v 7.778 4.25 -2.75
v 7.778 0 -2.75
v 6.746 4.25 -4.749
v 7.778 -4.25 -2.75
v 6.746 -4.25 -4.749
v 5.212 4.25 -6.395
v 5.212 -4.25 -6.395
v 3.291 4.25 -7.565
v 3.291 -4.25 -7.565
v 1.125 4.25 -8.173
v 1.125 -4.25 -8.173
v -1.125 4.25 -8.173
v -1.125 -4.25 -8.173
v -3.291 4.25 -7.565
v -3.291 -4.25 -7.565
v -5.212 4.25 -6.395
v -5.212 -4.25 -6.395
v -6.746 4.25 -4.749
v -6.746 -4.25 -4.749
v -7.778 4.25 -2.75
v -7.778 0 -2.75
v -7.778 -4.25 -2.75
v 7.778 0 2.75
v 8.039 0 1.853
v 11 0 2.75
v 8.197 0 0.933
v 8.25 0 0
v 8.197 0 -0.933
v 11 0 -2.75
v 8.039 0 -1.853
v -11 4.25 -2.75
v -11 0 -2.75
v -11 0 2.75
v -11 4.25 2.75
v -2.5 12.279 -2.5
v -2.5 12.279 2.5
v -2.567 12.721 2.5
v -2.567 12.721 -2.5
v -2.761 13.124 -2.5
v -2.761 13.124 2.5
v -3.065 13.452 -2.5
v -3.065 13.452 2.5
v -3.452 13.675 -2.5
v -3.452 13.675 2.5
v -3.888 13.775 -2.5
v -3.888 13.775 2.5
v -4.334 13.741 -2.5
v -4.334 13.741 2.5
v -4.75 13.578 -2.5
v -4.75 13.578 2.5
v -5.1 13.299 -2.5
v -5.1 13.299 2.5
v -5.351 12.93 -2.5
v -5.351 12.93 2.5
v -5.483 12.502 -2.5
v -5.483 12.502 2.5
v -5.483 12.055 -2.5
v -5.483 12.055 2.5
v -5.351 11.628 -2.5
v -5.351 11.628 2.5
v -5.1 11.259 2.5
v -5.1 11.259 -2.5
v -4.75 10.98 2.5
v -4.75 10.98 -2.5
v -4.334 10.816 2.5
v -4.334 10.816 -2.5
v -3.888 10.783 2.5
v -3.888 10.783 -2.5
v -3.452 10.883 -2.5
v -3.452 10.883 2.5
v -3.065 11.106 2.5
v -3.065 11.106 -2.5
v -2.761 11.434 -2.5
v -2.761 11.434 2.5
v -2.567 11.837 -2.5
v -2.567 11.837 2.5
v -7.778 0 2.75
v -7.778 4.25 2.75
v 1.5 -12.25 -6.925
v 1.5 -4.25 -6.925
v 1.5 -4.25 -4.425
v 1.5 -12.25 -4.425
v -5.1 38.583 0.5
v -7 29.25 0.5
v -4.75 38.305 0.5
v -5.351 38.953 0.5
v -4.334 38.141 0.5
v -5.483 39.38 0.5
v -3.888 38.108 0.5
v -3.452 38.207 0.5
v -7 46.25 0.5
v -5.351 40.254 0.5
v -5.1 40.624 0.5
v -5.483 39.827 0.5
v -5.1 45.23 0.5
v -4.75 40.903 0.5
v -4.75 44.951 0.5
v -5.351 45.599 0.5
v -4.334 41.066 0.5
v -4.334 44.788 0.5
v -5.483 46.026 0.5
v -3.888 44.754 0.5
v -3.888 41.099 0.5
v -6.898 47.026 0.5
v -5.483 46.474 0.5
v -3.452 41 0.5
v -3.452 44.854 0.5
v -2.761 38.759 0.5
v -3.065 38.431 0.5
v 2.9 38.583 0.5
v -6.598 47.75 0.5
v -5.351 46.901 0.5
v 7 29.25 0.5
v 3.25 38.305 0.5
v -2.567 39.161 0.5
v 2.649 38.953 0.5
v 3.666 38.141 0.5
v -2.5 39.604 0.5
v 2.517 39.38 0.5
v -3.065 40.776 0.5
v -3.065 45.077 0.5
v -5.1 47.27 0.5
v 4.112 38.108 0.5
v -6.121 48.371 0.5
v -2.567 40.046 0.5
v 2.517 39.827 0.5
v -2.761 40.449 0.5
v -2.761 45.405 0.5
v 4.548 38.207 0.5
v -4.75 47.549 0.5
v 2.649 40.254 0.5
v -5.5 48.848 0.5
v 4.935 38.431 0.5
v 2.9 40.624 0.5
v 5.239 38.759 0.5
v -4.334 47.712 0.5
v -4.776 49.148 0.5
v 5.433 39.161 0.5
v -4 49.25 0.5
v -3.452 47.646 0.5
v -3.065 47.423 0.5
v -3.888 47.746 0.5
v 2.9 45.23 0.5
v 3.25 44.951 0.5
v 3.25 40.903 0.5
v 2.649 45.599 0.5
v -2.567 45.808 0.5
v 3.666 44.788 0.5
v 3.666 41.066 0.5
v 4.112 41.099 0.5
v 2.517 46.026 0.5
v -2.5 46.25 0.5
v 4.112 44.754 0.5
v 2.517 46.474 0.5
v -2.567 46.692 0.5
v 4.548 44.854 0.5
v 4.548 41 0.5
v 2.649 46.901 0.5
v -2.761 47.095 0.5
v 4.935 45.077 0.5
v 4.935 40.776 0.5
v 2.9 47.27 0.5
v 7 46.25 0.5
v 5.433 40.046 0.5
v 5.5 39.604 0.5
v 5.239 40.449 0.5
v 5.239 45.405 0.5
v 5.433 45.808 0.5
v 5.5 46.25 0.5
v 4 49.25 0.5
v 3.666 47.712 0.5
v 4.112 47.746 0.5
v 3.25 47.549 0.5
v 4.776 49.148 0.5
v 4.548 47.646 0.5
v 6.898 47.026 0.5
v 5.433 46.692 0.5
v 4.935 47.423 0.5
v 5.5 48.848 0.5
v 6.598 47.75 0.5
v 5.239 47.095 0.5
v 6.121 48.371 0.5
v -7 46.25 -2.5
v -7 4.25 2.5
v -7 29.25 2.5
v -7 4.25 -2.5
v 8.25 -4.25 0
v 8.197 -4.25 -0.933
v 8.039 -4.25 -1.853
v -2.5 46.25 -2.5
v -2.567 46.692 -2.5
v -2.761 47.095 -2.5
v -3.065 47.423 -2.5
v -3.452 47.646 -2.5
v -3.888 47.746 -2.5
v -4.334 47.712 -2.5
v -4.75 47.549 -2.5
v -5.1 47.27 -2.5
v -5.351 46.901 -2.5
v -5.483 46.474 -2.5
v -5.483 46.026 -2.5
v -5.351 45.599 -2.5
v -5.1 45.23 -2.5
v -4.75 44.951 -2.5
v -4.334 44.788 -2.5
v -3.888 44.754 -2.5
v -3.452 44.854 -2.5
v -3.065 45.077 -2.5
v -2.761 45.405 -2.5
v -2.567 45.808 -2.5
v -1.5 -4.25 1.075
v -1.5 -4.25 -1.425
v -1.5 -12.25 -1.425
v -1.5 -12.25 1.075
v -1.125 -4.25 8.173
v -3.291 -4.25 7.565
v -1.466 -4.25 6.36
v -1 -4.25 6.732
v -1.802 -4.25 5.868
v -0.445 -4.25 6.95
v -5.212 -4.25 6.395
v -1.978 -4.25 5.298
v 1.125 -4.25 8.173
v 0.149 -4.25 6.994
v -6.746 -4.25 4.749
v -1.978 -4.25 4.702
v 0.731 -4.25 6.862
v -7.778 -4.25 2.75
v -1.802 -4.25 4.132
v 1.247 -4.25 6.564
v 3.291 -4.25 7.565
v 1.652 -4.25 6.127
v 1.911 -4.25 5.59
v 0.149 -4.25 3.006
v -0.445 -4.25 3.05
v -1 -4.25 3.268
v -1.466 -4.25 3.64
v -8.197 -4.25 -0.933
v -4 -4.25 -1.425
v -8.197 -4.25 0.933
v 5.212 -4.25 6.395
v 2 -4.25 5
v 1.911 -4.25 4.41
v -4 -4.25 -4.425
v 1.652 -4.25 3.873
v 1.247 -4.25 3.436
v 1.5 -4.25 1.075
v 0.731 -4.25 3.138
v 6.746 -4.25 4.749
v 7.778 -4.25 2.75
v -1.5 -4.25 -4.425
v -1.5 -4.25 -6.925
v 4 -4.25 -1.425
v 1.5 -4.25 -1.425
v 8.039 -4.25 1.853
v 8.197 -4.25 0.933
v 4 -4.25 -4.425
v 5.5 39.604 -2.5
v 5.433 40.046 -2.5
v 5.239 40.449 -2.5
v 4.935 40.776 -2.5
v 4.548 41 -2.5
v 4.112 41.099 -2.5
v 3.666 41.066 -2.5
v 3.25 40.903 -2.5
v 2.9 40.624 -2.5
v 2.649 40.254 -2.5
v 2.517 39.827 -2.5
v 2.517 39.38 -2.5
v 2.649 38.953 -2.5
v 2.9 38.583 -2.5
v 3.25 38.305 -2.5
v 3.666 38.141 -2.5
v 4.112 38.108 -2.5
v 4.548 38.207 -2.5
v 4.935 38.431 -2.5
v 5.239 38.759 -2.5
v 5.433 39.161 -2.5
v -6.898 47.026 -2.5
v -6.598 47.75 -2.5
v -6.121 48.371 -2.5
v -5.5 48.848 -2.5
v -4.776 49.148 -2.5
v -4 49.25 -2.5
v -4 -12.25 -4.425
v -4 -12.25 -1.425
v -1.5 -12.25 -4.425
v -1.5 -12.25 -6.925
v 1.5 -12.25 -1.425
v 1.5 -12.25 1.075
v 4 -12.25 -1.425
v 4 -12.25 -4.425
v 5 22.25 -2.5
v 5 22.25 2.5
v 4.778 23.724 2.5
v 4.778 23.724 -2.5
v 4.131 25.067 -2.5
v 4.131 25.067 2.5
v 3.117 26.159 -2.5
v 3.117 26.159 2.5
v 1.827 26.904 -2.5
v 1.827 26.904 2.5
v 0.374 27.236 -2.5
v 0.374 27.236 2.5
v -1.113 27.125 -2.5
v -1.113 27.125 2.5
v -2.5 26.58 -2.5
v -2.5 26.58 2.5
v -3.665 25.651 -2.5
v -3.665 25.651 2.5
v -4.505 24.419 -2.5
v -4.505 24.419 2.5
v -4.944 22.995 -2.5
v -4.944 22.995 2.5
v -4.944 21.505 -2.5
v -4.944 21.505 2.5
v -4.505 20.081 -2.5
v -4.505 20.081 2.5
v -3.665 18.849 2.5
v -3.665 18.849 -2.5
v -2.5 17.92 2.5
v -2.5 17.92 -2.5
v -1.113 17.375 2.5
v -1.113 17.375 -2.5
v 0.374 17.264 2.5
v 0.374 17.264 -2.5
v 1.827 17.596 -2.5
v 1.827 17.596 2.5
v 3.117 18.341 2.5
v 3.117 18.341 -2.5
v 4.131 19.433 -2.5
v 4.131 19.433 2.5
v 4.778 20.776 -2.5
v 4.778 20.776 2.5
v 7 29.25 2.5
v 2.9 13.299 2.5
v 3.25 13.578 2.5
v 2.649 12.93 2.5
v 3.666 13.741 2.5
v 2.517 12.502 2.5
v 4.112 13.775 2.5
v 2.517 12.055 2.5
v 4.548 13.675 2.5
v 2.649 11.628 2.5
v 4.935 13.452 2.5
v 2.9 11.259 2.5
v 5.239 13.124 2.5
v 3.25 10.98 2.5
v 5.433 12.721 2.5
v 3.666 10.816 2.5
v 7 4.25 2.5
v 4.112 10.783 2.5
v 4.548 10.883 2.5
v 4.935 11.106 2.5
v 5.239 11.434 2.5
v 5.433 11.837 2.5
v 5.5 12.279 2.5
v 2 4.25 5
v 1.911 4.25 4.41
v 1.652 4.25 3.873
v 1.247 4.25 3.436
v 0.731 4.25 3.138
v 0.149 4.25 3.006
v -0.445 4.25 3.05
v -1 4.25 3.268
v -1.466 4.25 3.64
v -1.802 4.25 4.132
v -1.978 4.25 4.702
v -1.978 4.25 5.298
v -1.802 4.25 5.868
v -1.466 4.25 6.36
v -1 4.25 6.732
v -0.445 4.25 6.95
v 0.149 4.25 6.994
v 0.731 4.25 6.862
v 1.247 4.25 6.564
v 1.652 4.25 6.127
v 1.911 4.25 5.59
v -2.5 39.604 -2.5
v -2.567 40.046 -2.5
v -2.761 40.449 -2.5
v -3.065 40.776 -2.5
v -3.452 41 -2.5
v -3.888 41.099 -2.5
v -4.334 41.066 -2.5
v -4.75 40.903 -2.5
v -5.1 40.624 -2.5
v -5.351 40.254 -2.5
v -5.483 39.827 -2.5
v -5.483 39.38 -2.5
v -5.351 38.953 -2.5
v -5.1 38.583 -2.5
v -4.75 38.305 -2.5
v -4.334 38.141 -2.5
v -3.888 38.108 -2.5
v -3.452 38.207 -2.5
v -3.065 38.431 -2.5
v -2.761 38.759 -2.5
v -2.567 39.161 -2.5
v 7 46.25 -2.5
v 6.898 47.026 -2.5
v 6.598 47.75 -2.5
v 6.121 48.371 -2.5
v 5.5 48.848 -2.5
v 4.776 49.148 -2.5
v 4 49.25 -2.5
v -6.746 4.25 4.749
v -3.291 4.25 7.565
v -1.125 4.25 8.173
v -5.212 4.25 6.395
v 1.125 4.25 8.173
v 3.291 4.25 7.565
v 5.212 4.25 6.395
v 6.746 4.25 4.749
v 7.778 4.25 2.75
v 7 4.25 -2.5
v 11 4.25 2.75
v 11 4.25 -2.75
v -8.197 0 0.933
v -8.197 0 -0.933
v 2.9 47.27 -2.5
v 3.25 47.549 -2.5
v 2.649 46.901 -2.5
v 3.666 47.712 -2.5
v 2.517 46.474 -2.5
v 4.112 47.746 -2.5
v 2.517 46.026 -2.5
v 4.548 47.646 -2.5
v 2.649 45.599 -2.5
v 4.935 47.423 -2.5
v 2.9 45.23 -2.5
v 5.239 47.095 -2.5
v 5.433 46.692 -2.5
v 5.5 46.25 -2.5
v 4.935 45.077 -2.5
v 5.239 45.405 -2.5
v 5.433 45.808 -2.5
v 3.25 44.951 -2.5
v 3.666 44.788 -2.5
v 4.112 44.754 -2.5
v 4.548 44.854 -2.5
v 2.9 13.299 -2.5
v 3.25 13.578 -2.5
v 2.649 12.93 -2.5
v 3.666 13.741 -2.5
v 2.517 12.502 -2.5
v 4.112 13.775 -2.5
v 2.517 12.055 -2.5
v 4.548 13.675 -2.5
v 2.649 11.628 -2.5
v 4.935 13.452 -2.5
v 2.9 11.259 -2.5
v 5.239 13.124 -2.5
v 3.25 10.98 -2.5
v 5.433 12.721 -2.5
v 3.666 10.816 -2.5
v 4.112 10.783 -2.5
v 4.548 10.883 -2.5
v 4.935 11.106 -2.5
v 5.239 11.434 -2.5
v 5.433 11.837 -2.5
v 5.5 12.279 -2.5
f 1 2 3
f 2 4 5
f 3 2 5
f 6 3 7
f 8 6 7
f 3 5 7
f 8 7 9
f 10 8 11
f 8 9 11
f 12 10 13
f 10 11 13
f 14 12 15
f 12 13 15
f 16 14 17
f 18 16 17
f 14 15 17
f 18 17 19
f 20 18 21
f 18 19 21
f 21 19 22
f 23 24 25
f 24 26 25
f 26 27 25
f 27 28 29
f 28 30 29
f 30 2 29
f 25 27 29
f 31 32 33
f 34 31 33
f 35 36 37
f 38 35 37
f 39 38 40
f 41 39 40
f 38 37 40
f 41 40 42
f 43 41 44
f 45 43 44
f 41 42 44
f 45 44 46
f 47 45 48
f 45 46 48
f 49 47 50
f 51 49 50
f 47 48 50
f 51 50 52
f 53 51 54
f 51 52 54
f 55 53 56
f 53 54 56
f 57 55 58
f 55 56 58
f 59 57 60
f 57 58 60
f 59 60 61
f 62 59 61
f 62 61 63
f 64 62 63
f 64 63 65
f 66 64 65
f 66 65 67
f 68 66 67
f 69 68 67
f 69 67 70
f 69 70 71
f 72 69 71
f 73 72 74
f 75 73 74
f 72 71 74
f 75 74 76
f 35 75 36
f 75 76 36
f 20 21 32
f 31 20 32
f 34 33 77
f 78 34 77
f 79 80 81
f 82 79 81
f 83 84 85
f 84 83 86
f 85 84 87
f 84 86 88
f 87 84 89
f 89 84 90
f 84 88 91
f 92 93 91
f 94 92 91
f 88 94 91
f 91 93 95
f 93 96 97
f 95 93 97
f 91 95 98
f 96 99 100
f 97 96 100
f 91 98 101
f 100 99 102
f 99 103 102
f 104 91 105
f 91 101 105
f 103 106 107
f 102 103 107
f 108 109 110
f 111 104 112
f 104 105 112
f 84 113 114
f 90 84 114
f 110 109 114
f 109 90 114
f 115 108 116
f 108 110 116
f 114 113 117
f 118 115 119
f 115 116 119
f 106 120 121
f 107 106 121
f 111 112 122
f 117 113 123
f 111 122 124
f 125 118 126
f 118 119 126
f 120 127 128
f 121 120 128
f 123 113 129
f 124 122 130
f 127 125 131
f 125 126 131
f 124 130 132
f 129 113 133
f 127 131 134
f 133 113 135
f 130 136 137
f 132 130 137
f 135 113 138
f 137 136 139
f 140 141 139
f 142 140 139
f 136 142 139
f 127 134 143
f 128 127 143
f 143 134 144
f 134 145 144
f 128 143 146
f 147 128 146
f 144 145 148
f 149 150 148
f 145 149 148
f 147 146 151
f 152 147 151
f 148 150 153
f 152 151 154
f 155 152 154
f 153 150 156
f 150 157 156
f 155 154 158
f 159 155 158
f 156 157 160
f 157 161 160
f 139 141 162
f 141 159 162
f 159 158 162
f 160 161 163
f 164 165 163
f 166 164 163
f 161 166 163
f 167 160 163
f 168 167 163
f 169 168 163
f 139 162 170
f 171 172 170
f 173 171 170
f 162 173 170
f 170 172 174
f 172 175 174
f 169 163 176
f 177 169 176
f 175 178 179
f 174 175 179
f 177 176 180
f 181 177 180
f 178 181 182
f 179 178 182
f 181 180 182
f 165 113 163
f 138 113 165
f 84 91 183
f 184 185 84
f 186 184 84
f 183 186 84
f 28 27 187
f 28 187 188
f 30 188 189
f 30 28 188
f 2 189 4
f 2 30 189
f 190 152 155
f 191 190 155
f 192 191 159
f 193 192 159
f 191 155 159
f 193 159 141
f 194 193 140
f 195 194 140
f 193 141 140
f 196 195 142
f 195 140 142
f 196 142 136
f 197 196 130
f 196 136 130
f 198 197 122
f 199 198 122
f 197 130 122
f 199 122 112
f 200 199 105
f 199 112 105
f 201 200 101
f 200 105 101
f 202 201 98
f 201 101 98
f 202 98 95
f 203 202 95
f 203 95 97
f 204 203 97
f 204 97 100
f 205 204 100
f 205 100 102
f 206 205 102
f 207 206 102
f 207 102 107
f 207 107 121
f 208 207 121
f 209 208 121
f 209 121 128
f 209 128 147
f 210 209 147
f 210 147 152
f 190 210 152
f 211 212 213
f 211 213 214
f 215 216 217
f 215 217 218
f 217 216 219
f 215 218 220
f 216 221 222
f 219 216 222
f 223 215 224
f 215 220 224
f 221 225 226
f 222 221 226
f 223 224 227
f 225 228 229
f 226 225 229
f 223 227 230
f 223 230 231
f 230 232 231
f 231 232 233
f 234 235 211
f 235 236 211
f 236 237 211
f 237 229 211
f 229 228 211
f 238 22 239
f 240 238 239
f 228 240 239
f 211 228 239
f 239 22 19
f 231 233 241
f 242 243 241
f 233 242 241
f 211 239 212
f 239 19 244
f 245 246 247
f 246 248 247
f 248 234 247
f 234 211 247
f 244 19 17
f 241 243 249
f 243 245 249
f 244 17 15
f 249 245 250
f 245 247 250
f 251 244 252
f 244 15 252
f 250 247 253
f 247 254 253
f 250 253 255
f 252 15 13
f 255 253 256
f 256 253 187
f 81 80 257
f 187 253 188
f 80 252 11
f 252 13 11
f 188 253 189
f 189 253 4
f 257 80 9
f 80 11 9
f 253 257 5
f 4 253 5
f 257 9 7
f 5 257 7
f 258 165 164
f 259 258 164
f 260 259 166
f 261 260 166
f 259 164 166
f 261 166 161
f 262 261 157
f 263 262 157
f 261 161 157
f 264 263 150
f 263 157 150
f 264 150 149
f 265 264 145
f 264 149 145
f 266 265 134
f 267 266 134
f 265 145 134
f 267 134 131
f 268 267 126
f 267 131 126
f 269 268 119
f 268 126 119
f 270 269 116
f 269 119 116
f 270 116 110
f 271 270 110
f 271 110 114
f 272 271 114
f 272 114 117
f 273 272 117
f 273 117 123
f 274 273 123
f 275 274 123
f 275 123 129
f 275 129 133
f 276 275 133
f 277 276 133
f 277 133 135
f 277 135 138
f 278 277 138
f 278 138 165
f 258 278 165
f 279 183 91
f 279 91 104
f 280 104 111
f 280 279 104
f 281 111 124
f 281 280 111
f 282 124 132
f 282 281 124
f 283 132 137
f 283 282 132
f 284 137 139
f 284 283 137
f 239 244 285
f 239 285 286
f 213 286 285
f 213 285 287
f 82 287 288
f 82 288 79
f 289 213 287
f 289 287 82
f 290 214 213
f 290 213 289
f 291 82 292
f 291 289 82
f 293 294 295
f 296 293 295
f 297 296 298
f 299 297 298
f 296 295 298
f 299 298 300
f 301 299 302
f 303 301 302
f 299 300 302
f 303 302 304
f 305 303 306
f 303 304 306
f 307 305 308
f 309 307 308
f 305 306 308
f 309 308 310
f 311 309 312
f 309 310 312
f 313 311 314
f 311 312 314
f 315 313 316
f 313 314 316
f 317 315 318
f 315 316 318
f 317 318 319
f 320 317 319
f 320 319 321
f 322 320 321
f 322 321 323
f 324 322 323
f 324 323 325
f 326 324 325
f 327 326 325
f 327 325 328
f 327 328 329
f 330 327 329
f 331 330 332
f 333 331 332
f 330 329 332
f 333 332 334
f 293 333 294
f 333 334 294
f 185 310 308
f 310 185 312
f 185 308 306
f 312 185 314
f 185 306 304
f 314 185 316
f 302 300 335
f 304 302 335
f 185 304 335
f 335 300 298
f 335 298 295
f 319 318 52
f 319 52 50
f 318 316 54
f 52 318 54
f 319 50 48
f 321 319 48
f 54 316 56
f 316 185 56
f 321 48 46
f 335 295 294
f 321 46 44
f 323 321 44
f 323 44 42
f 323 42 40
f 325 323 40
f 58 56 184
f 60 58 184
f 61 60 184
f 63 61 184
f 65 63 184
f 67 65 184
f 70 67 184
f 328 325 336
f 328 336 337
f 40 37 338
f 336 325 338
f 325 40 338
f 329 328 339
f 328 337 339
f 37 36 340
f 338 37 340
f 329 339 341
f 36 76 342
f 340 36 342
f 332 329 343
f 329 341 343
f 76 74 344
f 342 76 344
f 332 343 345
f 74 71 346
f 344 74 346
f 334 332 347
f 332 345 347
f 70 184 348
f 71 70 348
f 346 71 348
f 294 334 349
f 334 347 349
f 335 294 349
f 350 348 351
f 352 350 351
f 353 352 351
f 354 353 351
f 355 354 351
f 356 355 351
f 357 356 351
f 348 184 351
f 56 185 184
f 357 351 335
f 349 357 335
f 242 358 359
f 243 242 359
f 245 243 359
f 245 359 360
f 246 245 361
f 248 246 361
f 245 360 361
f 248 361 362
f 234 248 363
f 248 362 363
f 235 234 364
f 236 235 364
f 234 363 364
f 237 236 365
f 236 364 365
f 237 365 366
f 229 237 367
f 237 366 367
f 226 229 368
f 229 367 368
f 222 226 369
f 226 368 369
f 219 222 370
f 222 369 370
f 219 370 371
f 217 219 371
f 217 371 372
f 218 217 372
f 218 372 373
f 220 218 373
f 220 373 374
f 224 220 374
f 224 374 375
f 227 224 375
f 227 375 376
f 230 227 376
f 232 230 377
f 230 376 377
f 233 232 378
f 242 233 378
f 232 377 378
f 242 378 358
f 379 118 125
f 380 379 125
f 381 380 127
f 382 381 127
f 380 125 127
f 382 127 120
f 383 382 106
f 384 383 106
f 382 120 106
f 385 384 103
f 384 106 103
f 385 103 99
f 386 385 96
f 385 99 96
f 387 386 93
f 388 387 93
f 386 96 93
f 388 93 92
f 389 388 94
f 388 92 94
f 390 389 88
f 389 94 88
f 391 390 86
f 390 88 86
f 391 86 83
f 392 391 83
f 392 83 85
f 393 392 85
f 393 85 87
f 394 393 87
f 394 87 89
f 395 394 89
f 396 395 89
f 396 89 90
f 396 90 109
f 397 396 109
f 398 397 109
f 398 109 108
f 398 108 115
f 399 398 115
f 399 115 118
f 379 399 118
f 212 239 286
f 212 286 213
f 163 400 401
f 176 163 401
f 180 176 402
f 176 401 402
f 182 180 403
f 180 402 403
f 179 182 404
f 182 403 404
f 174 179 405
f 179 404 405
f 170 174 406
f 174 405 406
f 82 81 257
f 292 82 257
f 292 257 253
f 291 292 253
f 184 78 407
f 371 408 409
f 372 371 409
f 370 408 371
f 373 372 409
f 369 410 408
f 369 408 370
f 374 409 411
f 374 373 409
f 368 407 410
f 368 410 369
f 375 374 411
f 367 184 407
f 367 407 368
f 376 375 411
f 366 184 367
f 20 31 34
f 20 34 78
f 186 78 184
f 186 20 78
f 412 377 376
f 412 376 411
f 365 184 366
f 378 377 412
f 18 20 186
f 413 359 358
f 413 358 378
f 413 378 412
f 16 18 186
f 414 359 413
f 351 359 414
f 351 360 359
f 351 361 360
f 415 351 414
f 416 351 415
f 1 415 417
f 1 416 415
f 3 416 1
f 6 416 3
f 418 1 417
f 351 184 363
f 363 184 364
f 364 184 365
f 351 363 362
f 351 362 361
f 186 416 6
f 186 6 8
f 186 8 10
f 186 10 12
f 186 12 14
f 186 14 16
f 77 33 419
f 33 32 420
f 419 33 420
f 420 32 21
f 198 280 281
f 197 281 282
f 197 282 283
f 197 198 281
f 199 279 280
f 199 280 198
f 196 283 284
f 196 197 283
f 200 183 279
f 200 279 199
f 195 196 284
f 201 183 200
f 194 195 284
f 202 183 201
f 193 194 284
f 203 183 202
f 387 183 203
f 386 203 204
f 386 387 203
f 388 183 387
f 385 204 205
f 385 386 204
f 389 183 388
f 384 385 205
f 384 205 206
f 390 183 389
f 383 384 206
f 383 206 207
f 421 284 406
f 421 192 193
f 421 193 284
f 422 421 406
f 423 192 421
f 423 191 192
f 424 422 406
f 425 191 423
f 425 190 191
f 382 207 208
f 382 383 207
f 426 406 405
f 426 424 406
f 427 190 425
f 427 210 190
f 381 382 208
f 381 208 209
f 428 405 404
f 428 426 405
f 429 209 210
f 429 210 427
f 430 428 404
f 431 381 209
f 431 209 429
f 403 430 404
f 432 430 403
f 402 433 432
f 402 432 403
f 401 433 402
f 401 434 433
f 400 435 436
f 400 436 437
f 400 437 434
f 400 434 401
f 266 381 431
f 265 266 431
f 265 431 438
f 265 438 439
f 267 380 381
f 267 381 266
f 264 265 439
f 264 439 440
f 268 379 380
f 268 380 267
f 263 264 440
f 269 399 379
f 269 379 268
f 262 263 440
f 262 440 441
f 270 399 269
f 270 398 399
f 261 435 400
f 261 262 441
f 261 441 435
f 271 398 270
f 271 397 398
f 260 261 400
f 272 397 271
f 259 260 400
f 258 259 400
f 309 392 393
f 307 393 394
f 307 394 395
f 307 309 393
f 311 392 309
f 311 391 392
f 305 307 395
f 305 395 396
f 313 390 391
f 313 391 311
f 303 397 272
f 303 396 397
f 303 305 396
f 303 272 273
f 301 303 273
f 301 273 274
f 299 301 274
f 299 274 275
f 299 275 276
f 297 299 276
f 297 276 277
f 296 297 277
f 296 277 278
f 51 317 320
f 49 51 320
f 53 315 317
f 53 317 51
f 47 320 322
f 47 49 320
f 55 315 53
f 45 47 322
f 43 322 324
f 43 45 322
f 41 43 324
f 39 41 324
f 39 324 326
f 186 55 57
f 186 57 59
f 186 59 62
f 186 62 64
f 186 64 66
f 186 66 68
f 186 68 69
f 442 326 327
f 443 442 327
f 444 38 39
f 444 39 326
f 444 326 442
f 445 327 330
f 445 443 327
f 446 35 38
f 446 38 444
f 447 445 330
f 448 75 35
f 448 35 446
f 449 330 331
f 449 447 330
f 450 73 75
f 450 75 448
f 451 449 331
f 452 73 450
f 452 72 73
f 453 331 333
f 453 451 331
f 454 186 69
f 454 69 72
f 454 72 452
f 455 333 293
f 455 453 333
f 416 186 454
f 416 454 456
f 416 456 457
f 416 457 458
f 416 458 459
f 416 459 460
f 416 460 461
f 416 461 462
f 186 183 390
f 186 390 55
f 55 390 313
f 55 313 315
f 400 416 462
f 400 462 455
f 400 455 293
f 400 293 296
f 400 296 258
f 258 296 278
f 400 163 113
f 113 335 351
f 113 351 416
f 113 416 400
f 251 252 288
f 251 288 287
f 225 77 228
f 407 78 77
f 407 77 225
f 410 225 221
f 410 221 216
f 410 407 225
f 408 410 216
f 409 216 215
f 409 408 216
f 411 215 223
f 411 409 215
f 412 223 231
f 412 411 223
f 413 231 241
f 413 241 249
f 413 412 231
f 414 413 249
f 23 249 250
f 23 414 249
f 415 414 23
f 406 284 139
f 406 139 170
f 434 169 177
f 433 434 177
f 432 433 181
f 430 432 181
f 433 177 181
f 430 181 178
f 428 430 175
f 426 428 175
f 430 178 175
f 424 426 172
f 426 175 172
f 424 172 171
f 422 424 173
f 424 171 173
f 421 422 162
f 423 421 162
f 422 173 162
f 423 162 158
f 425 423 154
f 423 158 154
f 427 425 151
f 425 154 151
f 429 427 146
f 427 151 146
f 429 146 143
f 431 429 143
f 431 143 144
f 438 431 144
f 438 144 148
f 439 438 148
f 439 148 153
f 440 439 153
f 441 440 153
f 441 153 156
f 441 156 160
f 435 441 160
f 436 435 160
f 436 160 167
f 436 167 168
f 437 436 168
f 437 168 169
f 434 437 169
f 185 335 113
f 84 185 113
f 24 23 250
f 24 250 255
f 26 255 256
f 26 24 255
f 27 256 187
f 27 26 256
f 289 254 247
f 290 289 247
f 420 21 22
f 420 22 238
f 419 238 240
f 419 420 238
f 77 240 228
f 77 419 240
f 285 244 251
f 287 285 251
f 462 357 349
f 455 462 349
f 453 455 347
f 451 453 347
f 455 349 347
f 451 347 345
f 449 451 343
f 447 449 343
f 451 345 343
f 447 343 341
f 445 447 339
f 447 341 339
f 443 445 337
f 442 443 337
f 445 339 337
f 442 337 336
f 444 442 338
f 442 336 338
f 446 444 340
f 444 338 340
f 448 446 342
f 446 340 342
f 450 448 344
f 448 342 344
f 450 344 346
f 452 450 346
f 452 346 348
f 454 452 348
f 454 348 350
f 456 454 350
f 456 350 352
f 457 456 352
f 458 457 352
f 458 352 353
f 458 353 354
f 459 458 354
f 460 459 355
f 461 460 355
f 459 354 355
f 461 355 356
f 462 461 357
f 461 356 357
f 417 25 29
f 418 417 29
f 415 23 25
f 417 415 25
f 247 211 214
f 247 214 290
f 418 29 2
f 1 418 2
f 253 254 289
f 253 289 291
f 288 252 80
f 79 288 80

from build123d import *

# Parameters (mm, degrees)
BOSS_EXTRU_1_DEPTH      = 4.25
BOSS_EXTRU_2_DEPTH      = 4.25
ESQUISSE2_R             = 2
ENL_V_MAT_EXTRU_1_DEPTH = 8.5
ESQUISSE3_W             = 2.5
ESQUISSE3_H             = 3
ESQUISSE3_W_2           = 3
ESQUISSE3_H_2           = 2.5
BOSS_EXTRU_3_DEPTH      = 8
ESQUISSE4_W             = 14
ESQUISSE4_H             = 5
BOSS_EXTRU_4_DEPTH      = 45
ESQUISSE5_R             = 1.5
ESQUISSE5_R_2           = 5
ENL_V_MAT_EXTRU_2_DEPTH = 5
CONG_1_R                = 3
ESQUISSE6_W             = 2
ESQUISSE6_H             = 20
ENL_V_MAT_EXTRU_4_DEPTH = 14


with BuildPart() as part:
    # Esquisse1 → Boss.-Extru.1 (new body, symmetric)
    with BuildSketch(Plane(origin=(0, 0, 0), x_dir=(1, 0, 0), z_dir=(0, 1, 0))):
        with BuildLine():
            Line((7.778174593, -2.75), (-7.778174593, -2.75))
            ThreePointArc((-7.778174593, -2.75), (0, -8.25), (7.778174593, -2.75))
        make_face()
        with BuildLine():
            Line((7.778174593, 2.75), (-7.778174593, 2.75))
            ThreePointArc((-7.778174593, 2.75), (-8.25, 0), (-7.778174593, -2.75))
            Line((-7.778174593, -2.75), (7.778174593, -2.75))
            ThreePointArc((7.778174593, -2.75), (8.131188117, -1.395091324), (8.25, 0))
            ThreePointArc((8.25, 0), (8.131188117, 1.395091324), (7.778174593, 2.75))
        make_face()
        with BuildLine():
            ThreePointArc((7.778174593, 2.75), (0, 8.25), (-7.778174593, 2.75))
            Line((-7.778174593, 2.75), (7.778174593, 2.75))
        make_face()
    extrude(amount=BOSS_EXTRU_1_DEPTH, both=True)

    # Esquisse1<3> → Boss.-Extru.2 (add)
    with BuildSketch(Plane(origin=(0, 0, 0), x_dir=(1, 0, 0), z_dir=(0, 1, 0))):
        with BuildLine():
            Line((-7.778174593, 2.75), (-11, 2.75))
            Line((-11, 2.75), (-11, -2.75))
            Line((-11, -2.75), (-7.778174593, -2.75))
            ThreePointArc((-7.778174593, -2.75), (-8.25, 0), (-7.778174593, 2.75))
        make_face()
        with BuildLine():
            Line((11, 2.75), (7.778174593, 2.75))
            ThreePointArc((7.778174593, 2.75), (8.131188117, 1.395091324), (8.25, 0))
            ThreePointArc((8.25, 0), (8.131188117, -1.395091324), (7.778174593, -2.75))
            Line((7.778174593, -2.75), (11, -2.75))
            Line((11, -2.75), (11, 2.75))
        make_face()
    extrude(amount=BOSS_EXTRU_2_DEPTH)

    # Esquisse2 → Enlèv. mat.-Extru.1 (cut)
    with BuildSketch(Plane(origin=(0, 4.25, 0), x_dir=(1, 0, 0), z_dir=(0, 1, 0))):
        with Locations((0, -5)):
            Circle(ESQUISSE2_R)
    extrude(amount=-ENL_V_MAT_EXTRU_1_DEPTH, mode=Mode.SUBTRACT)

    # Esquisse3 → Boss.-Extru.3 (add)
    with BuildSketch(Plane.XZ.offset(4.25)):
        with Locations((-2.75, -2.924762745)):
            Rectangle(ESQUISSE3_W, ESQUISSE3_H)
        with Locations((0, -0.174762745)):
            Rectangle(ESQUISSE3_W_2, ESQUISSE3_H_2)
        with Locations((0, -2.924762745)):
            Rectangle(ESQUISSE3_W_2, ESQUISSE3_H)
        with Locations((0, -5.674762745)):
            Rectangle(ESQUISSE3_W_2, ESQUISSE3_H_2)
        with Locations((2.75, -2.924762745)):
            Rectangle(ESQUISSE3_W, ESQUISSE3_H)
    extrude(amount=BOSS_EXTRU_3_DEPTH)

    # Esquisse4 → Boss.-Extru.4 (add)
    with BuildSketch(Plane(origin=(0, 4.25, 0), x_dir=(1, 0, 0), z_dir=(0, 1, 0))):
        Rectangle(ESQUISSE4_W, ESQUISSE4_H)
    extrude(amount=BOSS_EXTRU_4_DEPTH)

    # Esquisse5 → Enlèv. mat.-Extru.2 (cut)
    with BuildSketch(Plane.XY.offset(2.5)):
        with Locations((-4, 46.25)):
            Circle(ESQUISSE5_R)
        with Locations((4, 46.25)):
            Circle(ESQUISSE5_R)
        with Locations((-4, 39.60357113)):
            Circle(ESQUISSE5_R)
        with Locations((4, 39.60357113)):
            Circle(ESQUISSE5_R)
        with Locations((0, 22.25)):
            Circle(ESQUISSE5_R_2)
        with Locations((-4, 12.278847644)):
            Circle(ESQUISSE5_R)
        with Locations((4, 12.278847644)):
            Circle(ESQUISSE5_R)
    extrude(amount=-ENL_V_MAT_EXTRU_2_DEPTH, mode=Mode.SUBTRACT)

    # Congé1
    cong_1_edges = [part.edges().sort_by_distance(p)[0] for p in [
        (-7, 49.25, 0),
        (7, 49.25, 0),
    ]]
    fillet(cong_1_edges, radius=CONG_1_R)

    # Esquisse6 → Enlèv. mat.-Extru.4 (cut)
    with BuildSketch(Plane(origin=(7, 0, 0), x_dir=(0, 0, -1), z_dir=(1, 0, 0))):
        with Locations((-1.5, 39.25)):
            Rectangle(ESQUISSE6_W, ESQUISSE6_H)
    extrude(amount=-ENL_V_MAT_EXTRU_4_DEPTH, mode=Mode.SUBTRACT)


solid = part.part
